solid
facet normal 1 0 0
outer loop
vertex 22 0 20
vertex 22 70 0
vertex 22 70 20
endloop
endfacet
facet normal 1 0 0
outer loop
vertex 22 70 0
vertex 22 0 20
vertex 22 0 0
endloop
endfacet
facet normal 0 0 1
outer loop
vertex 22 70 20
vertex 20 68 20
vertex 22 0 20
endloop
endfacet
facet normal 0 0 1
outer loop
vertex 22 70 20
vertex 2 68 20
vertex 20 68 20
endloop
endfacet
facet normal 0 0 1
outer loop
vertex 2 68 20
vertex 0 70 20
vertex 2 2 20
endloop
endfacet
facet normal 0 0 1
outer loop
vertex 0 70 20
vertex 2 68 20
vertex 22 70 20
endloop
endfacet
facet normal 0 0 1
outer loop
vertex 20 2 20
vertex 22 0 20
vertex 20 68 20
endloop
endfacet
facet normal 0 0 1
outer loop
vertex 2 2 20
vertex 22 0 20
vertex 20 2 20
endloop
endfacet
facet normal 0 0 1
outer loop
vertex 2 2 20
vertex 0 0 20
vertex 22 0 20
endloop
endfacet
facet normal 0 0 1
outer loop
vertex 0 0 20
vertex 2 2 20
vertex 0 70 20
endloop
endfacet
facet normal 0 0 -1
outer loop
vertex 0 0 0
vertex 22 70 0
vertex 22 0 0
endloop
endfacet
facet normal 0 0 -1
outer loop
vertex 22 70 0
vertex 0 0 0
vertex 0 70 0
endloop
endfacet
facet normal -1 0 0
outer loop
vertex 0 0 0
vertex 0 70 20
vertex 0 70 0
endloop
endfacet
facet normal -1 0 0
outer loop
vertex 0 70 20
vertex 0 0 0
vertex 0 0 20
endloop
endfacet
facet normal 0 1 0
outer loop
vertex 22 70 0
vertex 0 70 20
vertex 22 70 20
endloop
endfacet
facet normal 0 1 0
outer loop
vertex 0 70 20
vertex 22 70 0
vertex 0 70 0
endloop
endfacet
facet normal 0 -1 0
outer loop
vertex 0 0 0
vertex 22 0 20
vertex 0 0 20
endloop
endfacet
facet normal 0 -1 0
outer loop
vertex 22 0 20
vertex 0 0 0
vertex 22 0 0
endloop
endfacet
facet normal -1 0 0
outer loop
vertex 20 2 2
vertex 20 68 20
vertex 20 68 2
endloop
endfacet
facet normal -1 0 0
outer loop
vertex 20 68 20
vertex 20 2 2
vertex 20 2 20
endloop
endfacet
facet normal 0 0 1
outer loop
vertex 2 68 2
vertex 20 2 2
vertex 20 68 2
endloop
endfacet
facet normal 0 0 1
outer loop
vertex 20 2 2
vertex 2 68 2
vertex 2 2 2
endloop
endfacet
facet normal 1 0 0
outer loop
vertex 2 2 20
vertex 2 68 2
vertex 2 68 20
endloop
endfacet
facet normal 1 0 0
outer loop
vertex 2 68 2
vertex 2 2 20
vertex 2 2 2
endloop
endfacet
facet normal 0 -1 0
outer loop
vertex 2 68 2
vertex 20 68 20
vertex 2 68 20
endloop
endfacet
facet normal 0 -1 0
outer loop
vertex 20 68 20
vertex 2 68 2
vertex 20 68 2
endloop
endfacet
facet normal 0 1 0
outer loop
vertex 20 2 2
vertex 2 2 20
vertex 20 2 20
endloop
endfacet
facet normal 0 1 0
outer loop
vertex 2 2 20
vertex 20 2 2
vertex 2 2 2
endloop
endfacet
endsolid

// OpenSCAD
module h18650(){
  difference(){ cube([22,70,20]); translate([2,2,2]) cube([18,66,20]); }
}
h18650();
